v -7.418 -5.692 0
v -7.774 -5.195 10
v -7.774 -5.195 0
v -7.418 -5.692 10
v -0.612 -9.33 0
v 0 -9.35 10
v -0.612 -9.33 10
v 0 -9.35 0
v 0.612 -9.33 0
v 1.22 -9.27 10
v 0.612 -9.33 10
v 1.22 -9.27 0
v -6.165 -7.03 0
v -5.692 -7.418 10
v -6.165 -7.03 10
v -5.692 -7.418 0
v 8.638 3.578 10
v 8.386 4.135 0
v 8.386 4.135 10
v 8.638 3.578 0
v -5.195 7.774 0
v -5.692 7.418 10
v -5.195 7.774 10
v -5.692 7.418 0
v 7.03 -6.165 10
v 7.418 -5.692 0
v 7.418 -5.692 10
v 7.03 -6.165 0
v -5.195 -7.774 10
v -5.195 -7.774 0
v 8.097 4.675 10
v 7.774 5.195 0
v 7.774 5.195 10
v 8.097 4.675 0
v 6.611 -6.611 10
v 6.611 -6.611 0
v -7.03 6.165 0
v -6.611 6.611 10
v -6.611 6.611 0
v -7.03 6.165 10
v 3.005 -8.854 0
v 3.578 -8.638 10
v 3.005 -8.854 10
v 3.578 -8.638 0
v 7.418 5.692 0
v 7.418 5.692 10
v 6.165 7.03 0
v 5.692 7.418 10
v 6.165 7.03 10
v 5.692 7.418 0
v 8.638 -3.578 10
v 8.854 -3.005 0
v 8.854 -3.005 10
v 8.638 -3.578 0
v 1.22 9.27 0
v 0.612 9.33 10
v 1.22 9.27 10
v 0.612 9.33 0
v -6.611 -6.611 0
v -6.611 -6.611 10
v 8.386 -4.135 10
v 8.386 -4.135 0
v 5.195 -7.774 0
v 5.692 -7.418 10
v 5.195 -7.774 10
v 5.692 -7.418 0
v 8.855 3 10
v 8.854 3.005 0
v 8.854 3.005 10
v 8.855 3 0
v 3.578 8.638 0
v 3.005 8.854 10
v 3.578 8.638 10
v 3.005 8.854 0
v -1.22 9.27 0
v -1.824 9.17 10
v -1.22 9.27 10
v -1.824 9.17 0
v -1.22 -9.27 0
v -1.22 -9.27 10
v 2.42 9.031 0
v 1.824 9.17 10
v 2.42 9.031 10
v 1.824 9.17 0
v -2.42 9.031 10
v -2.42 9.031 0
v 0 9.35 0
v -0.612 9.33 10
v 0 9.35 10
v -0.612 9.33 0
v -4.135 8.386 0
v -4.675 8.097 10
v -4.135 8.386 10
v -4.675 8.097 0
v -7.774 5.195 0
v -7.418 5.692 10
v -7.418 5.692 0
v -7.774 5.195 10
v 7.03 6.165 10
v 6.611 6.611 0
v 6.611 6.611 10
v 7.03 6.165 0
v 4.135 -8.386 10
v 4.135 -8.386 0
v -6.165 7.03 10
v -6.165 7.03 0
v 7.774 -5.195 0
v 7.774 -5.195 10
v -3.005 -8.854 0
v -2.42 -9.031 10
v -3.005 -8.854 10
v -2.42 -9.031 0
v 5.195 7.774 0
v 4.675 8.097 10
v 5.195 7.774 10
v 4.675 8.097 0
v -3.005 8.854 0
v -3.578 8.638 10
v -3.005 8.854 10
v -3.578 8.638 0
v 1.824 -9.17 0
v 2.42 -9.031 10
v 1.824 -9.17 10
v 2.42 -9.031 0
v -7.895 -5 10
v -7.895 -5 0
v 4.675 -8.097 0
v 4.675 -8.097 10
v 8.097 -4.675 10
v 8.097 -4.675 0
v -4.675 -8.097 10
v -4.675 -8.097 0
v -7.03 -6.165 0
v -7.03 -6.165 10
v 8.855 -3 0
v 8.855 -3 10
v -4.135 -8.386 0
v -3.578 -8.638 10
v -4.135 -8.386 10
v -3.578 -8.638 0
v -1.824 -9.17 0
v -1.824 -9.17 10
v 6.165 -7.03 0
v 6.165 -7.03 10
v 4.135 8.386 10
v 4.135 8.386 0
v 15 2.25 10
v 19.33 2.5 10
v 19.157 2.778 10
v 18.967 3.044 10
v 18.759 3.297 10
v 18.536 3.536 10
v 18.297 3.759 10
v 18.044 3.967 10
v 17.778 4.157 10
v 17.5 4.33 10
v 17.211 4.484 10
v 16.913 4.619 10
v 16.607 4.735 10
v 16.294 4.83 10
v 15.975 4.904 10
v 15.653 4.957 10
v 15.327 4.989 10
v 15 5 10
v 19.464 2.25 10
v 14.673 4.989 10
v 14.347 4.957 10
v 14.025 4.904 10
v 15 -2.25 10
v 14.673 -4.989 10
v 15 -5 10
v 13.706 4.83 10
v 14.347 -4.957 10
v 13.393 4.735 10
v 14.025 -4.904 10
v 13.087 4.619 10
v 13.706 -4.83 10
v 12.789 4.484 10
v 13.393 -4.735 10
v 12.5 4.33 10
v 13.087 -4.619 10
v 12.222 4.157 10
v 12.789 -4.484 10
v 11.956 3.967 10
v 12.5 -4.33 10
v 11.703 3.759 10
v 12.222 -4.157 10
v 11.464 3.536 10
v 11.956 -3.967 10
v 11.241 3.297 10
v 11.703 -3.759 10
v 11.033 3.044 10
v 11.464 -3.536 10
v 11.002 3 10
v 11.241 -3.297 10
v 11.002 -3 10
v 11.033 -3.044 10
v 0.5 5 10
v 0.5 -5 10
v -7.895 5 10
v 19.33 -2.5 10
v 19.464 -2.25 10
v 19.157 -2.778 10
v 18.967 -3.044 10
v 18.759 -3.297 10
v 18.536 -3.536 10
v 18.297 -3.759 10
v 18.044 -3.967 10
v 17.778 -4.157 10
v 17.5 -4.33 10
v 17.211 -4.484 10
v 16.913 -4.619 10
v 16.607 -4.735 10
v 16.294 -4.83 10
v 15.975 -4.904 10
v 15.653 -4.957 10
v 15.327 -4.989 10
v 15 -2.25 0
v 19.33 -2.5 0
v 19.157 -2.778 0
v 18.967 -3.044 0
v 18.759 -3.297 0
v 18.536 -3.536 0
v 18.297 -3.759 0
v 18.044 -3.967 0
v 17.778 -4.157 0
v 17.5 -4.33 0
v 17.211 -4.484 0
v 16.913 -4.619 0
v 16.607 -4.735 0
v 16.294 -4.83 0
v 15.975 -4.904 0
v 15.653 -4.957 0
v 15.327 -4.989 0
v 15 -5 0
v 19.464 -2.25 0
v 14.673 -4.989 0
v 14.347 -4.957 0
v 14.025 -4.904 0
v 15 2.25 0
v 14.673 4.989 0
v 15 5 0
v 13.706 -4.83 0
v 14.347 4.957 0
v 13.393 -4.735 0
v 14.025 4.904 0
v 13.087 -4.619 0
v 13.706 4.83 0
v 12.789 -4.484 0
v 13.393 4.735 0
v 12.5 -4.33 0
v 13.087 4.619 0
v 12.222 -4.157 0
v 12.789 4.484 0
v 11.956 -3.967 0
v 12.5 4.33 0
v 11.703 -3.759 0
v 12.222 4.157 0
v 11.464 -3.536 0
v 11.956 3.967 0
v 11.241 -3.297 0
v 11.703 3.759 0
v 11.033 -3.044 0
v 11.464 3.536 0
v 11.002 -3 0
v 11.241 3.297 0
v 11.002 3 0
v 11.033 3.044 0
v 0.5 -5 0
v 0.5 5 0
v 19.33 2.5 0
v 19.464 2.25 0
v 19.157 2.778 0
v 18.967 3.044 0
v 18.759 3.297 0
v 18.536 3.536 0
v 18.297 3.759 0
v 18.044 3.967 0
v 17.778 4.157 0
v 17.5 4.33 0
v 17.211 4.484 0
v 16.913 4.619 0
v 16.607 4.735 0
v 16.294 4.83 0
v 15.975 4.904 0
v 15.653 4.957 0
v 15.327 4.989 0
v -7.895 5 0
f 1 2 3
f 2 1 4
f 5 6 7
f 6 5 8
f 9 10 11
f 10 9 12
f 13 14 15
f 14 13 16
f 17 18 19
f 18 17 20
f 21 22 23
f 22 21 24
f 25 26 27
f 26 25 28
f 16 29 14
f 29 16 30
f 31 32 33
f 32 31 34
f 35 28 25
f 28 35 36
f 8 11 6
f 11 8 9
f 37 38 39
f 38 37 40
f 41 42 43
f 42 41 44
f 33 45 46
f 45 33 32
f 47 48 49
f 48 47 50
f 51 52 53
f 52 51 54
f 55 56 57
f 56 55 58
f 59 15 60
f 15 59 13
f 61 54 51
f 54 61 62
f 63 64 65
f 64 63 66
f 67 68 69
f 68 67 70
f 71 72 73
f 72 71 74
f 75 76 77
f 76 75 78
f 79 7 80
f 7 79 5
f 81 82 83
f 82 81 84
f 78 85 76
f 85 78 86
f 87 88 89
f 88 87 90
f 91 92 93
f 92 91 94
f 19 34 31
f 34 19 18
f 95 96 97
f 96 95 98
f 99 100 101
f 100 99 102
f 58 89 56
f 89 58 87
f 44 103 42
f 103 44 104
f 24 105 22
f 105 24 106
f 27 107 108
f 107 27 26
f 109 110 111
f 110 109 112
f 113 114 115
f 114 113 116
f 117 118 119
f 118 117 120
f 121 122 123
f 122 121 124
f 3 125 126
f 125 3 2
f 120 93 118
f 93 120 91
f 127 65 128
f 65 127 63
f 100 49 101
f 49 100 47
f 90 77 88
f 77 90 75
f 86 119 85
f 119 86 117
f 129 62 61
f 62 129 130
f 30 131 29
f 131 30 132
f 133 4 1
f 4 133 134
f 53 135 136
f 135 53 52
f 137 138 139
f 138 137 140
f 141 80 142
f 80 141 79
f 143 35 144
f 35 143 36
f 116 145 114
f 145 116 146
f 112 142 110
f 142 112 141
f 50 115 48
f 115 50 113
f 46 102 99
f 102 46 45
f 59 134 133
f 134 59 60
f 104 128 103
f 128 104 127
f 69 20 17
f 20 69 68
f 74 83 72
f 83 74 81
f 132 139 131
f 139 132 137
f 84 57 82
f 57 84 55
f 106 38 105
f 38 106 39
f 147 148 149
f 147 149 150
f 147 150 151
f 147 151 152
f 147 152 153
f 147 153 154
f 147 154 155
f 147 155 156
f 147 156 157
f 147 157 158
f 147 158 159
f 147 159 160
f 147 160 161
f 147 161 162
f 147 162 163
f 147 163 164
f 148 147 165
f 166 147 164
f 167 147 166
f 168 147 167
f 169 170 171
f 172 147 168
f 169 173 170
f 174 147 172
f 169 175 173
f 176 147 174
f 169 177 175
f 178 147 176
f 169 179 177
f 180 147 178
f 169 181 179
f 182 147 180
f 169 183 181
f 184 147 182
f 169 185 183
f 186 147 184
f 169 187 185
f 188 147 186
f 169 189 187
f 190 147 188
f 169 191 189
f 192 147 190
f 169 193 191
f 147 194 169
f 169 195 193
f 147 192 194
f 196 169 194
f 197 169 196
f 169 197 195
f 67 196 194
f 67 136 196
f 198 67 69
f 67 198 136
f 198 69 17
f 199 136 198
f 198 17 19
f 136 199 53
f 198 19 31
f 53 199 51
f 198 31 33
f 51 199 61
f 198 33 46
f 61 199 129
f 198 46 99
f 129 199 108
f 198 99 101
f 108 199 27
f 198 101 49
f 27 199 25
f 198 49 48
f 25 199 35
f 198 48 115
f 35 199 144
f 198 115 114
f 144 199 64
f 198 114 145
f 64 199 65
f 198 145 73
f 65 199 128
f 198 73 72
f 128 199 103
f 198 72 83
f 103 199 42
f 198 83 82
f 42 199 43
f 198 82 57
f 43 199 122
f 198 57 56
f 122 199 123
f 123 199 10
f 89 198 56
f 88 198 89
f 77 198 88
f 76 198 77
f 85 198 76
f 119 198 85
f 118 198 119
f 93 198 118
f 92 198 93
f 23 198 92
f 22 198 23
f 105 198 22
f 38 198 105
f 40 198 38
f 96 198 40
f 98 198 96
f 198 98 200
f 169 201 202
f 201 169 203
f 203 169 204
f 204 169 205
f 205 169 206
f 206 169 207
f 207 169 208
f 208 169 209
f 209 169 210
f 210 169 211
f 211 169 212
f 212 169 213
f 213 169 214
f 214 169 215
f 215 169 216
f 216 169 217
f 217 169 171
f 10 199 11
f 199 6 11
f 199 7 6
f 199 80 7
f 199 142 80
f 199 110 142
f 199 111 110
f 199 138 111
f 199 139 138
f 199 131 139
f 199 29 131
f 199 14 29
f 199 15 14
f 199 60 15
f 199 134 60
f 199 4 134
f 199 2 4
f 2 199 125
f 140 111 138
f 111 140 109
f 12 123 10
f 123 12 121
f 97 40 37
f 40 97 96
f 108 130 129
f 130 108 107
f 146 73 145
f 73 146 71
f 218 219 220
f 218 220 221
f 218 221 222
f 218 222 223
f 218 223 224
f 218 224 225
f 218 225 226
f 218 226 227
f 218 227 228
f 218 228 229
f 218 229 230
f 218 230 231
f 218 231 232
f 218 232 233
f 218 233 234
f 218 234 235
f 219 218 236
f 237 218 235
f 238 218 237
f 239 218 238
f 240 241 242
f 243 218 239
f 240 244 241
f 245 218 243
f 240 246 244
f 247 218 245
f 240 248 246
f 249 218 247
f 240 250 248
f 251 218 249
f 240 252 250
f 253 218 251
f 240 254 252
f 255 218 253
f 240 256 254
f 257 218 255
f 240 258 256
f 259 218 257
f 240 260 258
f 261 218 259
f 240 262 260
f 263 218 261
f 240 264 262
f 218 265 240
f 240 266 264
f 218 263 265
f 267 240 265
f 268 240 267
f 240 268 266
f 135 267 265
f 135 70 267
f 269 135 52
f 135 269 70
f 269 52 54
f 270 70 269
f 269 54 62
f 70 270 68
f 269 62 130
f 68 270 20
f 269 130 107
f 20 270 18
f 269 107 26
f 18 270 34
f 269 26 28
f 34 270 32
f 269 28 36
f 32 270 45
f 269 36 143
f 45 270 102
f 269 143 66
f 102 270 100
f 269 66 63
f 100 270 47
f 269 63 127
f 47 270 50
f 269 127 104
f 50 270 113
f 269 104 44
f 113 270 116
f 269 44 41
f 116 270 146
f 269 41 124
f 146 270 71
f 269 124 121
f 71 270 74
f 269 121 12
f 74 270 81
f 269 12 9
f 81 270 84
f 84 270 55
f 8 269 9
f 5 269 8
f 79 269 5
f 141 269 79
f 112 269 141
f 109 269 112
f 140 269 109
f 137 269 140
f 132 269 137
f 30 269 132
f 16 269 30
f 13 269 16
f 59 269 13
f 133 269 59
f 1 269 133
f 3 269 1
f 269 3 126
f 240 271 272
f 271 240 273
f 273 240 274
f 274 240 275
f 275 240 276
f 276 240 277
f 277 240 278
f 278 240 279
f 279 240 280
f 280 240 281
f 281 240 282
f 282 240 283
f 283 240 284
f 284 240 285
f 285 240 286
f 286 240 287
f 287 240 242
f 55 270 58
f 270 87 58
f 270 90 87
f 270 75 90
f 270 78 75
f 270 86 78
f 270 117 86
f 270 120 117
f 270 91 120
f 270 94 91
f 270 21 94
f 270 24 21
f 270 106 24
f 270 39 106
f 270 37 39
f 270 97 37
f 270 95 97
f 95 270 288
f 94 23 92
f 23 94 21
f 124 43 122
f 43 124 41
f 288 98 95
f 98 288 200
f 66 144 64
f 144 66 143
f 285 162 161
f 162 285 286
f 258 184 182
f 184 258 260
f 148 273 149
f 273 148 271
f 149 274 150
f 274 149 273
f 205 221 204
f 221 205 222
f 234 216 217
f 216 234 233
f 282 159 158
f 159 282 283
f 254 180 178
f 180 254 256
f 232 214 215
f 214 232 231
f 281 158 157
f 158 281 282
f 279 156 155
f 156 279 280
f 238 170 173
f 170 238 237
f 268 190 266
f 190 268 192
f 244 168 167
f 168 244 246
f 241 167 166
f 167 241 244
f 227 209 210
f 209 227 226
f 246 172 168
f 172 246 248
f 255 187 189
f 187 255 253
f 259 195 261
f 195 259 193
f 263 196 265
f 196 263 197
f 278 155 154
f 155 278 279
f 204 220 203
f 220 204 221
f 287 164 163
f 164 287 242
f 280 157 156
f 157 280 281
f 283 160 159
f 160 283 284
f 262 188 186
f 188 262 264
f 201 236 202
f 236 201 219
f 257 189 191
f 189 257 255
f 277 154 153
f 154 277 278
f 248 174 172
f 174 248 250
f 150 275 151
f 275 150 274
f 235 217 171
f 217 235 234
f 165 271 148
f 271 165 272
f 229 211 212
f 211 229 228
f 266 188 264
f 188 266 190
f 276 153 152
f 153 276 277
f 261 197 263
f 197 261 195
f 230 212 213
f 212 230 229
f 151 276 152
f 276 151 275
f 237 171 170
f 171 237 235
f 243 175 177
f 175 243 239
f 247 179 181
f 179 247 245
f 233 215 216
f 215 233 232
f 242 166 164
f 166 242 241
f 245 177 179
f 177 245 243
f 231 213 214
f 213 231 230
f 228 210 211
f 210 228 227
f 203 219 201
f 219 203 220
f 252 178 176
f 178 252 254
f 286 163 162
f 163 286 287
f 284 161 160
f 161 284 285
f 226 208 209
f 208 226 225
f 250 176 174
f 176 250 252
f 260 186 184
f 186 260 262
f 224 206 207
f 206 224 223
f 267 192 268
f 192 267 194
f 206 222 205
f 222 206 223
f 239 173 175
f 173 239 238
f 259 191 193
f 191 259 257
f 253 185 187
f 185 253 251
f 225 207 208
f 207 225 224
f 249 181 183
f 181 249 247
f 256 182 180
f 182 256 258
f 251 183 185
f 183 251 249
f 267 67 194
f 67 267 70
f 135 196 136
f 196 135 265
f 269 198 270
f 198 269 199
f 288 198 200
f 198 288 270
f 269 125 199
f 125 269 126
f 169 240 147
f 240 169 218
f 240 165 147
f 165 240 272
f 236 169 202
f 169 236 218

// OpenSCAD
// Tubing clip for 12.7 mm lab stand rod
// Print orientation: flat on bed, extruded in +Z

$fn = 96;

// ---- Ring 1: rod ring ----
ring1_id   = 12.7;   // inner diameter (rod clearance)
ring1_wall = 3;      // wall thickness
ring1_od   = ring1_id + 2 * ring1_wall; // outer diameter = 18.7
ring1_x0   = 0;      // centre X
ring1_y0   = 0;      // centre Y

// ---- Ring 2: tubing ring ----
ring2_id   = 6;      // inner diameter
ring2_wall = 2;      // wall thickness
ring2_od   = ring2_id + 2 * ring2_wall; // outer diameter = 10
ring2_x0   = 15;     // centre X
ring2_y0   = 0;      // centre Y

// ---- Opening cuts ----
open1_w = 10;        // rod ring opening width (-X side)
open2_w = 4.5;       // tubing ring opening width (+X side)

// ---- Bridge ----
bridge_x0 = 10;      // bridge centre X (between x = 8 and x = 12)
bridge_w  = 6;       // bridge width (Y)

// ---- Misc ----
eps = 0.5;           // cut overshoot past faces
ht  = 10;            // extrusion height (Z)

difference() {
    union() {
        // Rod ring
        cylinder(d = ring1_od, h = ht);
        // Tubing ring
        translate([ring2_x0, ring2_y0, 0])
            cylinder(d = ring2_od, h = ht);
        // Bridge
        translate([bridge_x0 - bridge_w / 2, -bridge_w / 2, 0])
            cube([bridge_w, bridge_w, ht]);
    }
    // Cut out rod ring opening (x < 0, -5 < y < 5)
    translate([-ring1_od - eps, -open1_w / 2, 0])
        cube([ring1_od + 2 * eps, open1_w, ht + eps]);
    // Cut out tubing ring opening (x > 15, -2.25 < y < 2.25)
    translate([ring2_x0, -open2_w / 2, 0])
        cube([ring2_od + 2 * eps, open2_w, ht + eps]);
}
